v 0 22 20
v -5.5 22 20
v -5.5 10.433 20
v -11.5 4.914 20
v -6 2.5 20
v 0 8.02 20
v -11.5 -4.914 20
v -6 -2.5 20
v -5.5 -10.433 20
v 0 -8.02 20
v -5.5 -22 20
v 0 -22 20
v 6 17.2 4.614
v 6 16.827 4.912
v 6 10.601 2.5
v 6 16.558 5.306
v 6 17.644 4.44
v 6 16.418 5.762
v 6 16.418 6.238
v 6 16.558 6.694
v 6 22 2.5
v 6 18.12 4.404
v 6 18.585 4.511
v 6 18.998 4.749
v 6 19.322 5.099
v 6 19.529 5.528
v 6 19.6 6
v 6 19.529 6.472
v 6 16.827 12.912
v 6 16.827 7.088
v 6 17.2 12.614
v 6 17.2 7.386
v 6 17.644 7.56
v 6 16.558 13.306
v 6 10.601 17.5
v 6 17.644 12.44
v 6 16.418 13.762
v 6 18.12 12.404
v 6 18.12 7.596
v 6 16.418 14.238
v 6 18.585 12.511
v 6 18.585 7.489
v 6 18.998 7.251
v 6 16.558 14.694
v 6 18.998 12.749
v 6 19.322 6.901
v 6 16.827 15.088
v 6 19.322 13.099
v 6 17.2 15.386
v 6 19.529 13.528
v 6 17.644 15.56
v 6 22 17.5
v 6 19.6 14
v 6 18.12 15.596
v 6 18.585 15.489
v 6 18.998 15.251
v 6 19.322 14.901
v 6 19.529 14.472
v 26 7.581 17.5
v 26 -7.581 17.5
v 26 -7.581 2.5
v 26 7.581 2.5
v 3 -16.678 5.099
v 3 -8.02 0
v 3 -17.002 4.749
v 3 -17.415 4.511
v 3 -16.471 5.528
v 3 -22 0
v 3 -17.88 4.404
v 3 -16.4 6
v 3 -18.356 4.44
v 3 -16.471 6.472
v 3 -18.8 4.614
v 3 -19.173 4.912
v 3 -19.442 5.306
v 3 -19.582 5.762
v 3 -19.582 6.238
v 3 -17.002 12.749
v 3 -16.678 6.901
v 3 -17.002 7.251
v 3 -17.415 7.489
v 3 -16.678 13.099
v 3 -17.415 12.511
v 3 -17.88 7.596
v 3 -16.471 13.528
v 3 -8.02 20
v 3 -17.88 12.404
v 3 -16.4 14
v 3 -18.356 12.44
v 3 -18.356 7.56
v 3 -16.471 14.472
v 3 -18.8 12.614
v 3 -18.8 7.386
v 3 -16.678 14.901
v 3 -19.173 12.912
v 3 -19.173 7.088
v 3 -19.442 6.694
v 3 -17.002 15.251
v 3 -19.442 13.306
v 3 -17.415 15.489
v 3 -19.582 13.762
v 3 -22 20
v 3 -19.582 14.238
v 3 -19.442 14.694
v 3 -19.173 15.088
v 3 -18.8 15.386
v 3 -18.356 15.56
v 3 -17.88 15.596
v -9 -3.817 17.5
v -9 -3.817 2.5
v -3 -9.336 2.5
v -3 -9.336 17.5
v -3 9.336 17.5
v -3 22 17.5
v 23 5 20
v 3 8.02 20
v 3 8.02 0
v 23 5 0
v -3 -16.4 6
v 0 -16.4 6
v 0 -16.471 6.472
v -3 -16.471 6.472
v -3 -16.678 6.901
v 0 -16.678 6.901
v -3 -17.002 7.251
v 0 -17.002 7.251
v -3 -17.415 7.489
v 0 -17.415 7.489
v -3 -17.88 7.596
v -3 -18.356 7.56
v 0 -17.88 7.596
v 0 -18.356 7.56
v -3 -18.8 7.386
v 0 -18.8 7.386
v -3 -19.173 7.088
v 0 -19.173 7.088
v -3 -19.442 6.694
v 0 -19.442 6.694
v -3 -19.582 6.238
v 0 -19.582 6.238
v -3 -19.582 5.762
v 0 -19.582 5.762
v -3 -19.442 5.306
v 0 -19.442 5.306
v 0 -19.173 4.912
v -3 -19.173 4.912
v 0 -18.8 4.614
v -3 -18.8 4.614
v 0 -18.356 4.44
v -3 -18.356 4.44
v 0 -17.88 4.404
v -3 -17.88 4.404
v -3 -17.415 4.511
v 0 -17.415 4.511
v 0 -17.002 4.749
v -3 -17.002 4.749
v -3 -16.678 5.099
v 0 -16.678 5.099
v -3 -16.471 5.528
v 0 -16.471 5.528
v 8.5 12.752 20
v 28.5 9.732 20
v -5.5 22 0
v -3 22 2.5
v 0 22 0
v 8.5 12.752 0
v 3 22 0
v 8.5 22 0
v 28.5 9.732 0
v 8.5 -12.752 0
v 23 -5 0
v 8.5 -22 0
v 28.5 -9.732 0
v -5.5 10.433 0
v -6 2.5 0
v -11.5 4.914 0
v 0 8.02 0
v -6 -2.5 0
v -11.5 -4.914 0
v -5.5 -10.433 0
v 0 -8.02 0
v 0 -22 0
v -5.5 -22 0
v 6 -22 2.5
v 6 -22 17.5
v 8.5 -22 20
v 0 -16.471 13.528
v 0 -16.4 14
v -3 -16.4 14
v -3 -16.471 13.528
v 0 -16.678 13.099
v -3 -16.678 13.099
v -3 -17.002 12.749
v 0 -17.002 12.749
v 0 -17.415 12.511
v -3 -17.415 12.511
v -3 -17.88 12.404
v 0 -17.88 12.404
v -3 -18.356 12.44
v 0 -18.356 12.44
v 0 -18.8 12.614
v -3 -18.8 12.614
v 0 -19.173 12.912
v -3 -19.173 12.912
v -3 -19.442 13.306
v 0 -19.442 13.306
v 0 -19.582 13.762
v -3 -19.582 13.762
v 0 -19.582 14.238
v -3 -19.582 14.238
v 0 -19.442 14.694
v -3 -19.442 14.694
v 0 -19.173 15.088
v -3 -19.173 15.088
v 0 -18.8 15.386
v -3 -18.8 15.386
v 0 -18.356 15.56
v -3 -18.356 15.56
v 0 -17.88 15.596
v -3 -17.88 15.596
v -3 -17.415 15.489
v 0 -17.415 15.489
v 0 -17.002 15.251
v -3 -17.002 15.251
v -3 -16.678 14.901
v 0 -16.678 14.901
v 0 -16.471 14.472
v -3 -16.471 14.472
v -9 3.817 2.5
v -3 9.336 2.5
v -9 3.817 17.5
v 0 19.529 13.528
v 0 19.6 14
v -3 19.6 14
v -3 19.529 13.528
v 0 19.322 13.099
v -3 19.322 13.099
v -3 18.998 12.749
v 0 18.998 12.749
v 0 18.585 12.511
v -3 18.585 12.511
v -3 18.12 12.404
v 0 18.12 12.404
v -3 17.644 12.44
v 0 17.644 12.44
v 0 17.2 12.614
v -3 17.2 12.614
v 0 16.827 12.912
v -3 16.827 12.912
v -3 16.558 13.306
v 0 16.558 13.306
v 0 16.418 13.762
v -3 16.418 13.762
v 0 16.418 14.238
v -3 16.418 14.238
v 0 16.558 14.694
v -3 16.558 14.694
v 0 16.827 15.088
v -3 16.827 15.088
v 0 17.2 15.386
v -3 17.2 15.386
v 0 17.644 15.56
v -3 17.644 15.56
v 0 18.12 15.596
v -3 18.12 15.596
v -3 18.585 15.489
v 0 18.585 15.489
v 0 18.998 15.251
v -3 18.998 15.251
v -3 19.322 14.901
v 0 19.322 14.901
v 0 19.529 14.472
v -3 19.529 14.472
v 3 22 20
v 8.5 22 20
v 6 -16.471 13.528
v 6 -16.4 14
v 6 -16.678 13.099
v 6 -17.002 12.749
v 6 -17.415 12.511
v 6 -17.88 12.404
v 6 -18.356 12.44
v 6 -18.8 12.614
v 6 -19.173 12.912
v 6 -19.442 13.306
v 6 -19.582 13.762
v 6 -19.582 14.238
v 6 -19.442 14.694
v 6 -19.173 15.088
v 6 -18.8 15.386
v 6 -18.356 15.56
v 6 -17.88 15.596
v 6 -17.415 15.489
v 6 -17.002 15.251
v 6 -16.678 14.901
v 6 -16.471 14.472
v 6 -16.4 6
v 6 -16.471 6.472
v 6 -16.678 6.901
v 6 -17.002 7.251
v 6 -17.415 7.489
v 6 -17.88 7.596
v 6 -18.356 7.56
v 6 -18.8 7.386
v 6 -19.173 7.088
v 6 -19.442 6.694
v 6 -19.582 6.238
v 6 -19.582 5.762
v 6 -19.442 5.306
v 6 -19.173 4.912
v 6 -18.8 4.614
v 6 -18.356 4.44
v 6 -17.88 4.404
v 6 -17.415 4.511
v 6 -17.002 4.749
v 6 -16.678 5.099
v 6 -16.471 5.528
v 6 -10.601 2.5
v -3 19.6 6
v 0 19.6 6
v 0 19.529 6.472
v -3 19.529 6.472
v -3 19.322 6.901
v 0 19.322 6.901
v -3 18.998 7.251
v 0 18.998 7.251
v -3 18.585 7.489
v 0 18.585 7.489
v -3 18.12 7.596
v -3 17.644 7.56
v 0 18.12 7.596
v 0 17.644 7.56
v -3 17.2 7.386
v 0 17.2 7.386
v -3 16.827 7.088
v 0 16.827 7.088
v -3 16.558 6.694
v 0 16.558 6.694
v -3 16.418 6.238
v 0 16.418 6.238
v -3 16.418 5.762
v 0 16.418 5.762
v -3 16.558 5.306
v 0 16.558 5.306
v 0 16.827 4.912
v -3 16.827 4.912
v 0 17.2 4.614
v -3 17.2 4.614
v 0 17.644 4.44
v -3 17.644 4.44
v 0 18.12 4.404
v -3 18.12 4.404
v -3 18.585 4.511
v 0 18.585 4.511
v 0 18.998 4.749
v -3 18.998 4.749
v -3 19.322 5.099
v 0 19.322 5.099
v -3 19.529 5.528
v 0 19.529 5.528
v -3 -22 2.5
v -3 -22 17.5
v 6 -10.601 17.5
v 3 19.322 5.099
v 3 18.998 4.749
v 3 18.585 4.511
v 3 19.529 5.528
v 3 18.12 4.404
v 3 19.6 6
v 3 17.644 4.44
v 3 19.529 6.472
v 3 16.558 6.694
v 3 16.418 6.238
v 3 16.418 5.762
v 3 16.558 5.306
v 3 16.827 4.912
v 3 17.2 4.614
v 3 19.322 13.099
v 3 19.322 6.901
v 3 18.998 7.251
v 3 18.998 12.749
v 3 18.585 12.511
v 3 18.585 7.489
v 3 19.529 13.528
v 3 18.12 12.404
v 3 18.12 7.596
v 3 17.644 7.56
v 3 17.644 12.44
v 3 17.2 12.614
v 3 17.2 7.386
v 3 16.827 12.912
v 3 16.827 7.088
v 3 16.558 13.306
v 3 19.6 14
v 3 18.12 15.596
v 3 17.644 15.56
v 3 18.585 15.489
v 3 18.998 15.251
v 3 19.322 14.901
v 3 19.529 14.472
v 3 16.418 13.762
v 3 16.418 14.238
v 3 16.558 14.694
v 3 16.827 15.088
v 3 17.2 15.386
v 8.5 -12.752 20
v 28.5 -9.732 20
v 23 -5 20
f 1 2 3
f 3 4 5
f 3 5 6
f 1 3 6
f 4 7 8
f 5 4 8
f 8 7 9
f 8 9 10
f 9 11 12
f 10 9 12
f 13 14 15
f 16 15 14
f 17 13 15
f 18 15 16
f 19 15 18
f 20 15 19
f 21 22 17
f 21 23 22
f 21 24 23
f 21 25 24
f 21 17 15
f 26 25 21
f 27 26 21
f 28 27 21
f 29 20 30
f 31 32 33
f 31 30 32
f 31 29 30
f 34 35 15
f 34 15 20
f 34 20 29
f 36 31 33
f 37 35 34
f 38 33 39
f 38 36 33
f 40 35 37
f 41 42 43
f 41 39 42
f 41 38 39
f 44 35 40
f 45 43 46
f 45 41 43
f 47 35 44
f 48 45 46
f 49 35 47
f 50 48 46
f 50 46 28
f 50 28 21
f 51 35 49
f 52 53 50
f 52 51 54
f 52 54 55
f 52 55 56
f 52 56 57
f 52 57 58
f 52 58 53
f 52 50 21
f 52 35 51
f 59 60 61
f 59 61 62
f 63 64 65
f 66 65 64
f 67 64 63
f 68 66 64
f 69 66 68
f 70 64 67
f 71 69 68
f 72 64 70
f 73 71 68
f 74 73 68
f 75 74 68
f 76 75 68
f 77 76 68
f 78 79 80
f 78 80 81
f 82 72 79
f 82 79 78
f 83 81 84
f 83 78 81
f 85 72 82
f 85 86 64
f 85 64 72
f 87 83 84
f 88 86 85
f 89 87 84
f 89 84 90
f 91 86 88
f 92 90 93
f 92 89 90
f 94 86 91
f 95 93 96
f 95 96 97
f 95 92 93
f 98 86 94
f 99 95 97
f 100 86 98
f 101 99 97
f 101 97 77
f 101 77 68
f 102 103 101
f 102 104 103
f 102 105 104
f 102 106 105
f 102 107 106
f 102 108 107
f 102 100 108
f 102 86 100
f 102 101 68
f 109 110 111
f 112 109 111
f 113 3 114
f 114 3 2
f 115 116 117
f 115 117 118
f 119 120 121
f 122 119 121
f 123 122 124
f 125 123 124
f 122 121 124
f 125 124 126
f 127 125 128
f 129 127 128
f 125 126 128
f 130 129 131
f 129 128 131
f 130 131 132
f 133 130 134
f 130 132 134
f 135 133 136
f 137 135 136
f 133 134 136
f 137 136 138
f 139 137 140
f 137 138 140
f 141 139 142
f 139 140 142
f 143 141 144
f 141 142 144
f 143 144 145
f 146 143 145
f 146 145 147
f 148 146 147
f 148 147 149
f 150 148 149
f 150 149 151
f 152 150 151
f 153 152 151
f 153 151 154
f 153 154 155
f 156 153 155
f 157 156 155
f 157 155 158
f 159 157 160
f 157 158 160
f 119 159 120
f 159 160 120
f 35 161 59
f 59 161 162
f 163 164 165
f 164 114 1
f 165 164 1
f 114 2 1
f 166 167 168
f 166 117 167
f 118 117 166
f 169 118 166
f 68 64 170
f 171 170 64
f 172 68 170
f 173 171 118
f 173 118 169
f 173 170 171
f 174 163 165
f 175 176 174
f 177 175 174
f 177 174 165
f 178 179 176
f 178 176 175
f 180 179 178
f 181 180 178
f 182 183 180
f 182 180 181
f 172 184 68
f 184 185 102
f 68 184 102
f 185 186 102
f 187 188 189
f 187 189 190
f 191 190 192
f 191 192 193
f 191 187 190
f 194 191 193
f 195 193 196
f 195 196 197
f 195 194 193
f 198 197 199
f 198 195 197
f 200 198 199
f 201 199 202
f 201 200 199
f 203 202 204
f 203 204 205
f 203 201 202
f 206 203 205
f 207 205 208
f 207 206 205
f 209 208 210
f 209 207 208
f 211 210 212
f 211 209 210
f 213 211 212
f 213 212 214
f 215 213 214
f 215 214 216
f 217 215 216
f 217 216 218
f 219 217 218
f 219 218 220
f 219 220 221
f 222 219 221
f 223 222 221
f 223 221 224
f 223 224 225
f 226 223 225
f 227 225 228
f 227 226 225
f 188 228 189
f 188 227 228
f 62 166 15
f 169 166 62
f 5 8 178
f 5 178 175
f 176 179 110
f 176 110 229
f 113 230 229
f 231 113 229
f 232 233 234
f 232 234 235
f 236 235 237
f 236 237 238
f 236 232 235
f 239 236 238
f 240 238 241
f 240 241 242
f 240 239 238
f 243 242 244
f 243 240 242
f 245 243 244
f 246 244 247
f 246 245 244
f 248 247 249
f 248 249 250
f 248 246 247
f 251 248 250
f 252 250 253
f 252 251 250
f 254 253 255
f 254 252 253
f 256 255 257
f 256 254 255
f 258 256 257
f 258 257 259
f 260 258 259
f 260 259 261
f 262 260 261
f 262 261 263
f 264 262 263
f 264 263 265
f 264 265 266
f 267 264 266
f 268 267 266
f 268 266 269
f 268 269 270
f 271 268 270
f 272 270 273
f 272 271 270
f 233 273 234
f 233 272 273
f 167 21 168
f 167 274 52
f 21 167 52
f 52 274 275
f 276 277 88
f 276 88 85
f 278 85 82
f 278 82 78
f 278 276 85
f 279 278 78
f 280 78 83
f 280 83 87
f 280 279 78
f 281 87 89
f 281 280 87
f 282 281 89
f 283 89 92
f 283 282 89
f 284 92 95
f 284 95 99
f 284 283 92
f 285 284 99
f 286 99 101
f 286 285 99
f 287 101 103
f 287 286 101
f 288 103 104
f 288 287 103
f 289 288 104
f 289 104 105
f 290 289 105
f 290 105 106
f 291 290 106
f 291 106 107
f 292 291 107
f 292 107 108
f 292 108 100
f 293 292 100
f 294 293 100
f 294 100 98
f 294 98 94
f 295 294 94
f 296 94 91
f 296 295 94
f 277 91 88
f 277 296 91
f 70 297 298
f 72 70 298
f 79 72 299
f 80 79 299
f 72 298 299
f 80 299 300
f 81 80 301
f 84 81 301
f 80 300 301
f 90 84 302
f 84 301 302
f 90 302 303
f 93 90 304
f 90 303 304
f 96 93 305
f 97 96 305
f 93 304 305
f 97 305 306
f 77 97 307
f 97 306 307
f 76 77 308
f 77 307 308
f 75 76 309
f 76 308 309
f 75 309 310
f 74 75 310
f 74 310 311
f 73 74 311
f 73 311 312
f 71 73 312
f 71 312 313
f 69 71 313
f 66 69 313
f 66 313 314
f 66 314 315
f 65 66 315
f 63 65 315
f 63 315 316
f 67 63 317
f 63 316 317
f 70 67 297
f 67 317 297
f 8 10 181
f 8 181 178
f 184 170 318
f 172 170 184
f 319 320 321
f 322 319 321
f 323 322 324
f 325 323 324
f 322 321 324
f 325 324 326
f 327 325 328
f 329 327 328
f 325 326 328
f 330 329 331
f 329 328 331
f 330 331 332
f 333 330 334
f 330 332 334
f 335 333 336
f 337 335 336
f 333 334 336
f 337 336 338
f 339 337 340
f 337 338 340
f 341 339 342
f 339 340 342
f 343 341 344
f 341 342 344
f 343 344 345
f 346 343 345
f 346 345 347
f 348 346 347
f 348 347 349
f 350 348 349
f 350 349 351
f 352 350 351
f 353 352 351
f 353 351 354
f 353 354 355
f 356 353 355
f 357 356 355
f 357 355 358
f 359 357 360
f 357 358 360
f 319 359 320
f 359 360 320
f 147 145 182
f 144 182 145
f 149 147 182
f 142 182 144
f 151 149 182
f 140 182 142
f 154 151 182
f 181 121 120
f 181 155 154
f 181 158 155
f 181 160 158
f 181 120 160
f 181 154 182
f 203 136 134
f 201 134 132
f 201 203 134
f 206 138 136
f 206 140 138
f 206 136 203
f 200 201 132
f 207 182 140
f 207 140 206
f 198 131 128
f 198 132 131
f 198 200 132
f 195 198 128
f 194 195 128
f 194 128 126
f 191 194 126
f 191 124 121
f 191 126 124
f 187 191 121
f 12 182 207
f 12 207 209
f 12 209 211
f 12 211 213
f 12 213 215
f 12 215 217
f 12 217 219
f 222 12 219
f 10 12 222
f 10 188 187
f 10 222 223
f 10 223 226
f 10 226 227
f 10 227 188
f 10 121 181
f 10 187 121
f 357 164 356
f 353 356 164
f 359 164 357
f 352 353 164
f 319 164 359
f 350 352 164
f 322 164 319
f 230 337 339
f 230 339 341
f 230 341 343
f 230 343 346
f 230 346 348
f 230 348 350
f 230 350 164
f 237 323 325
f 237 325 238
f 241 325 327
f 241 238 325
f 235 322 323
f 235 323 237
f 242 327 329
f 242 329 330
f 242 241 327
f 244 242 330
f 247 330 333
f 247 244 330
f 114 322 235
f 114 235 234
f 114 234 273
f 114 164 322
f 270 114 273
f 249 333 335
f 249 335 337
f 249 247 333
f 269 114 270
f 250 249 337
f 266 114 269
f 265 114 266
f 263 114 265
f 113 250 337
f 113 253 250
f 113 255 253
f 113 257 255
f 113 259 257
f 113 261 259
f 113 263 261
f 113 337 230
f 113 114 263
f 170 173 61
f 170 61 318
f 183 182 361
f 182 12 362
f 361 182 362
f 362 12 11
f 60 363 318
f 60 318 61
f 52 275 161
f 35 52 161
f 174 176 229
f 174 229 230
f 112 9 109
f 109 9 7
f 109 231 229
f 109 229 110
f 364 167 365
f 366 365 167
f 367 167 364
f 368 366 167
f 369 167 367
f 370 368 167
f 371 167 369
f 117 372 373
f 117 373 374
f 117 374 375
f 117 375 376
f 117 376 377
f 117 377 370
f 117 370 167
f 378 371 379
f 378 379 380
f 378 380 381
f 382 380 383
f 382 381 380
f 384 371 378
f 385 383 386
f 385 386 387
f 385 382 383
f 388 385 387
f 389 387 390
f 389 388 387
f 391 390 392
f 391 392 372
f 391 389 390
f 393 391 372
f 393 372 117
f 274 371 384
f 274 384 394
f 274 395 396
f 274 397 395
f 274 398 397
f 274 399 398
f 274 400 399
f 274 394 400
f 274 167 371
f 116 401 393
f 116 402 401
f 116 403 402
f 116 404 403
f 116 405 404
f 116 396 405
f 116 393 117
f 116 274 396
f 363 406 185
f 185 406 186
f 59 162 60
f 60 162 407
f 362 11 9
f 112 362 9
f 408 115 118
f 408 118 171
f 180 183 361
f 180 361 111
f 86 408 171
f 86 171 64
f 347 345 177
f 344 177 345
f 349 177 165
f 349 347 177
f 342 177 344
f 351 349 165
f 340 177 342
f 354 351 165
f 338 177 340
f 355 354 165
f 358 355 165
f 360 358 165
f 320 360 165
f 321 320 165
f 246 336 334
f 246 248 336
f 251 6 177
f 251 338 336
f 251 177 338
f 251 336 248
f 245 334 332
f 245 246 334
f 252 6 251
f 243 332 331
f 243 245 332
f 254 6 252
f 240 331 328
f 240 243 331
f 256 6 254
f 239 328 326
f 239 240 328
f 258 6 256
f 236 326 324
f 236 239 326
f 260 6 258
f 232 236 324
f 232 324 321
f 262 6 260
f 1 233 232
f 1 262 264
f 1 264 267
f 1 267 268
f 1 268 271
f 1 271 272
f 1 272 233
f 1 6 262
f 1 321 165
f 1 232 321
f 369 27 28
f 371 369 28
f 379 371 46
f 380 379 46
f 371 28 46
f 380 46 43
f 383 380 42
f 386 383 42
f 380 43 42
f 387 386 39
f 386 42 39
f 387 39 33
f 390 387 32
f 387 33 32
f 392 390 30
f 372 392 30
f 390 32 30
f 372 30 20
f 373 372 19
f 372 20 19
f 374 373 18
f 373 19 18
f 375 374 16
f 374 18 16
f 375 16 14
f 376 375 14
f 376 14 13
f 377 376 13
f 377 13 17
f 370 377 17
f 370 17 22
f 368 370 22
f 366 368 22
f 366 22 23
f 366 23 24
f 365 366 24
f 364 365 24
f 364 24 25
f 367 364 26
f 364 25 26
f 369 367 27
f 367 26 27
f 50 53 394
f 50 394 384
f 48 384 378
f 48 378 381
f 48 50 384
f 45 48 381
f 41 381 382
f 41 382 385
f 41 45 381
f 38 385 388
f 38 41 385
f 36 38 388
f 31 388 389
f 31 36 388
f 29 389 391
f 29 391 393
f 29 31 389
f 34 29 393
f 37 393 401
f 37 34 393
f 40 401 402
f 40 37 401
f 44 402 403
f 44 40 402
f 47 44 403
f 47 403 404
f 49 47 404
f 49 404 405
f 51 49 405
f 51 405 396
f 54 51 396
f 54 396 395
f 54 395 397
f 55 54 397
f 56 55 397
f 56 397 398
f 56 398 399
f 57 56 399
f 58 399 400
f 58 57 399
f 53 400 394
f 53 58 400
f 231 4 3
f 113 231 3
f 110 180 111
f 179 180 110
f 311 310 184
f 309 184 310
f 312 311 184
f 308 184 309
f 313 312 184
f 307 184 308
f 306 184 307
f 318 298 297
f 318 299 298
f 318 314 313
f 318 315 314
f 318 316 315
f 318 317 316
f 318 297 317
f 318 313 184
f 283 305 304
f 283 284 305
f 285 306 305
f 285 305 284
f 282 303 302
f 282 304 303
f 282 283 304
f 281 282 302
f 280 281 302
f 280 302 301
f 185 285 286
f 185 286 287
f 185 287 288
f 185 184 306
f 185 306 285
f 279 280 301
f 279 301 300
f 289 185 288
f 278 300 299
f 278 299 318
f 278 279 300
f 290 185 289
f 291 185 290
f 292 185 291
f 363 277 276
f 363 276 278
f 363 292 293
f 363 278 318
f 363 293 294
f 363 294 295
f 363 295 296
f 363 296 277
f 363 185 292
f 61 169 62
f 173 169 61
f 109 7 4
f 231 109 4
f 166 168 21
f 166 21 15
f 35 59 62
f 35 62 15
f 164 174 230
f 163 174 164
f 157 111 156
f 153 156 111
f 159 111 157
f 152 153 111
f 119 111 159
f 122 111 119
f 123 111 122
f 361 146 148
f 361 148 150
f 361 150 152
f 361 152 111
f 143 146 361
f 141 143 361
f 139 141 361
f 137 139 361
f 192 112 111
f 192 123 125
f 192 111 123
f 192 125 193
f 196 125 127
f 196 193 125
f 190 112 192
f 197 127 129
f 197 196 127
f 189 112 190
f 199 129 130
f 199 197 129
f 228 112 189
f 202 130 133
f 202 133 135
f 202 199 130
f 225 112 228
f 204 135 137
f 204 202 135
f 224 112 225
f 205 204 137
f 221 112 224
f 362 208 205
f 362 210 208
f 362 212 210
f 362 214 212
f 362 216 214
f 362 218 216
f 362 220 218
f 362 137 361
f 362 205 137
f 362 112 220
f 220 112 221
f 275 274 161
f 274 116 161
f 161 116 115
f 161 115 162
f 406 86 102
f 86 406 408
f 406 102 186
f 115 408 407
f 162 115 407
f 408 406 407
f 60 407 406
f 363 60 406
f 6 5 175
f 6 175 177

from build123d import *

# Parameters (mm, degrees)
F1_DEPTH   = 10
F2_R       = 1.6
F3_DEPTH   = 3
F5_DEPTH   = 10
F6_R       = 1.6
F7_DEPTH   = 3
F9_DEPTH   = 2.5
F11_DEPTH  = 2.5
F12_SIZE   = 2.49999
F12_2_SIZE = 2.49999


# Not quite as in the source:
# - a fillet or chamfer is up to 0.001 mm smaller than in the source, because OpenCascade refuses the exact size


with BuildPart() as f1:
    # F0 (on Top) → F1 (new body)
    with BuildSketch(Plane.XY):
        Polygon((-3, -22), (0, -22), (0, -8.0198083574), (-6, -2.5), (-6, 2.5), (0, 8.0198083574), (0, 22), (-3, 22), (-3, 9.3363083632), (-9, 3.8165000058), (-9, 0), (-9, -3.8165000058), (-3, -9.3363083632), align=None)
    extrude(amount=F1_DEPTH)

    # F2 (on face) → F3 (cut, through all)
    with BuildSketch(Plane.YZ):
        with Locations((-18, 6)):
            Circle(F2_R)
        with Locations((18, 6)):
            Circle(F2_R)
    extrude(amount=-F3_DEPTH, mode=Mode.SUBTRACT)

    # F8 (on face) → F9 (join)
    with BuildSketch(Plane(origin=(0, 0, 0), x_dir=(1, 0, 0), z_dir=(0, 0, -1))):
        Polygon((-3, 9.3363083632), (-3, 22), (-5.5, 22), (-5.5, 10.4333917014), (-11.5, 4.913583344), (-11.5, -4.913583344), (-5.5, -10.4333917014), (-5.5, -22), (-3, -22), (-3, -9.3363083632), (-9, -3.8165000058), (-9, 3.8165000058), align=None)
    extrude(amount=-F9_DEPTH)

    # F12#2 (size 2.5 in the source; OpenCascade refuses exactly that, so slightly less here)
    f12_2_edges = [f1.edges().sort_by_distance(p)[0] for p in [
        (-5.5, 16.216696, 2.5),
        (-8.5, 7.673488, 2.5),
        (-11.5, 0, 2.5),
        (-8.5, -7.673488, 2.5),
        (-5.5, -16.216696, 2.5),
    ]]
    chamfer(f12_2_edges, length=F12_2_SIZE)



with BuildPart() as f5:
    # F4 (on Top) → F5 (new body)
    with BuildSketch(Plane.XY):
        Polygon((3, -8.0198083574), (3, -22), (6, -22), (6, -10.6008415462), (26, -7.5810331888), (26, 7.5810331888), (6, 10.6008415462), (6, 22), (3, 22), (3, 8.0198083574), (23, 5), (23, 0), (23, -5), align=None)
    extrude(amount=F5_DEPTH)

    # F6 (on face) → F7 (cut, through all)
    with BuildSketch(Plane.YZ.offset(6)):
        with Locations((-18, 6)):
            Circle(F6_R)
        with Locations((18, 6)):
            Circle(F6_R)
    extrude(amount=-F7_DEPTH, mode=Mode.SUBTRACT)

    # F10 (on face) → F11 (join)
    with BuildSketch(Plane(origin=(0, 0, 0), x_dir=(1, 0, 0), z_dir=(0, 0, -1))):
        Polygon((6, -10.6008415462), (6, -22), (8.5, -22), (8.5, -12.7517025368), (28.5, -9.7318941795), (28.5, 9.7318941795), (8.5, 12.7517025368), (8.5, 22), (6, 22), (6, 10.6008415462), (26, 7.5810331888), (26, -7.5810331888), align=None)
    extrude(amount=-F11_DEPTH)

    # F12 (size 2.5 in the source; OpenCascade refuses exactly that, so slightly less here)
    f12_edges = [f5.edges().sort_by_distance(p)[0] for p in [
        (8.5, 17.375851, 2.5),
        (18.5, 11.241798, 2.5),
        (28.5, 0, 2.5),
        (18.5, -11.241798, 2.5),
        (8.5, -17.375851, 2.5),
    ]]
    chamfer(f12_edges, length=F12_SIZE)


with BuildPart() as f1_1:
    add(f1.part)

    add(f5.part)  # F13 merges F5
    # F13: F1, F5 across face
    add(f1.part.mirror(Plane(origin=(-3.2621858931, 0, 10), x_dir=(1, 0, 0), z_dir=(0, 0, 1))))
    add(f5.part.mirror(Plane(origin=(-3.2621858931, 0, 10), x_dir=(1, 0, 0), z_dir=(0, 0, 1))))


solid = f1_1.part
